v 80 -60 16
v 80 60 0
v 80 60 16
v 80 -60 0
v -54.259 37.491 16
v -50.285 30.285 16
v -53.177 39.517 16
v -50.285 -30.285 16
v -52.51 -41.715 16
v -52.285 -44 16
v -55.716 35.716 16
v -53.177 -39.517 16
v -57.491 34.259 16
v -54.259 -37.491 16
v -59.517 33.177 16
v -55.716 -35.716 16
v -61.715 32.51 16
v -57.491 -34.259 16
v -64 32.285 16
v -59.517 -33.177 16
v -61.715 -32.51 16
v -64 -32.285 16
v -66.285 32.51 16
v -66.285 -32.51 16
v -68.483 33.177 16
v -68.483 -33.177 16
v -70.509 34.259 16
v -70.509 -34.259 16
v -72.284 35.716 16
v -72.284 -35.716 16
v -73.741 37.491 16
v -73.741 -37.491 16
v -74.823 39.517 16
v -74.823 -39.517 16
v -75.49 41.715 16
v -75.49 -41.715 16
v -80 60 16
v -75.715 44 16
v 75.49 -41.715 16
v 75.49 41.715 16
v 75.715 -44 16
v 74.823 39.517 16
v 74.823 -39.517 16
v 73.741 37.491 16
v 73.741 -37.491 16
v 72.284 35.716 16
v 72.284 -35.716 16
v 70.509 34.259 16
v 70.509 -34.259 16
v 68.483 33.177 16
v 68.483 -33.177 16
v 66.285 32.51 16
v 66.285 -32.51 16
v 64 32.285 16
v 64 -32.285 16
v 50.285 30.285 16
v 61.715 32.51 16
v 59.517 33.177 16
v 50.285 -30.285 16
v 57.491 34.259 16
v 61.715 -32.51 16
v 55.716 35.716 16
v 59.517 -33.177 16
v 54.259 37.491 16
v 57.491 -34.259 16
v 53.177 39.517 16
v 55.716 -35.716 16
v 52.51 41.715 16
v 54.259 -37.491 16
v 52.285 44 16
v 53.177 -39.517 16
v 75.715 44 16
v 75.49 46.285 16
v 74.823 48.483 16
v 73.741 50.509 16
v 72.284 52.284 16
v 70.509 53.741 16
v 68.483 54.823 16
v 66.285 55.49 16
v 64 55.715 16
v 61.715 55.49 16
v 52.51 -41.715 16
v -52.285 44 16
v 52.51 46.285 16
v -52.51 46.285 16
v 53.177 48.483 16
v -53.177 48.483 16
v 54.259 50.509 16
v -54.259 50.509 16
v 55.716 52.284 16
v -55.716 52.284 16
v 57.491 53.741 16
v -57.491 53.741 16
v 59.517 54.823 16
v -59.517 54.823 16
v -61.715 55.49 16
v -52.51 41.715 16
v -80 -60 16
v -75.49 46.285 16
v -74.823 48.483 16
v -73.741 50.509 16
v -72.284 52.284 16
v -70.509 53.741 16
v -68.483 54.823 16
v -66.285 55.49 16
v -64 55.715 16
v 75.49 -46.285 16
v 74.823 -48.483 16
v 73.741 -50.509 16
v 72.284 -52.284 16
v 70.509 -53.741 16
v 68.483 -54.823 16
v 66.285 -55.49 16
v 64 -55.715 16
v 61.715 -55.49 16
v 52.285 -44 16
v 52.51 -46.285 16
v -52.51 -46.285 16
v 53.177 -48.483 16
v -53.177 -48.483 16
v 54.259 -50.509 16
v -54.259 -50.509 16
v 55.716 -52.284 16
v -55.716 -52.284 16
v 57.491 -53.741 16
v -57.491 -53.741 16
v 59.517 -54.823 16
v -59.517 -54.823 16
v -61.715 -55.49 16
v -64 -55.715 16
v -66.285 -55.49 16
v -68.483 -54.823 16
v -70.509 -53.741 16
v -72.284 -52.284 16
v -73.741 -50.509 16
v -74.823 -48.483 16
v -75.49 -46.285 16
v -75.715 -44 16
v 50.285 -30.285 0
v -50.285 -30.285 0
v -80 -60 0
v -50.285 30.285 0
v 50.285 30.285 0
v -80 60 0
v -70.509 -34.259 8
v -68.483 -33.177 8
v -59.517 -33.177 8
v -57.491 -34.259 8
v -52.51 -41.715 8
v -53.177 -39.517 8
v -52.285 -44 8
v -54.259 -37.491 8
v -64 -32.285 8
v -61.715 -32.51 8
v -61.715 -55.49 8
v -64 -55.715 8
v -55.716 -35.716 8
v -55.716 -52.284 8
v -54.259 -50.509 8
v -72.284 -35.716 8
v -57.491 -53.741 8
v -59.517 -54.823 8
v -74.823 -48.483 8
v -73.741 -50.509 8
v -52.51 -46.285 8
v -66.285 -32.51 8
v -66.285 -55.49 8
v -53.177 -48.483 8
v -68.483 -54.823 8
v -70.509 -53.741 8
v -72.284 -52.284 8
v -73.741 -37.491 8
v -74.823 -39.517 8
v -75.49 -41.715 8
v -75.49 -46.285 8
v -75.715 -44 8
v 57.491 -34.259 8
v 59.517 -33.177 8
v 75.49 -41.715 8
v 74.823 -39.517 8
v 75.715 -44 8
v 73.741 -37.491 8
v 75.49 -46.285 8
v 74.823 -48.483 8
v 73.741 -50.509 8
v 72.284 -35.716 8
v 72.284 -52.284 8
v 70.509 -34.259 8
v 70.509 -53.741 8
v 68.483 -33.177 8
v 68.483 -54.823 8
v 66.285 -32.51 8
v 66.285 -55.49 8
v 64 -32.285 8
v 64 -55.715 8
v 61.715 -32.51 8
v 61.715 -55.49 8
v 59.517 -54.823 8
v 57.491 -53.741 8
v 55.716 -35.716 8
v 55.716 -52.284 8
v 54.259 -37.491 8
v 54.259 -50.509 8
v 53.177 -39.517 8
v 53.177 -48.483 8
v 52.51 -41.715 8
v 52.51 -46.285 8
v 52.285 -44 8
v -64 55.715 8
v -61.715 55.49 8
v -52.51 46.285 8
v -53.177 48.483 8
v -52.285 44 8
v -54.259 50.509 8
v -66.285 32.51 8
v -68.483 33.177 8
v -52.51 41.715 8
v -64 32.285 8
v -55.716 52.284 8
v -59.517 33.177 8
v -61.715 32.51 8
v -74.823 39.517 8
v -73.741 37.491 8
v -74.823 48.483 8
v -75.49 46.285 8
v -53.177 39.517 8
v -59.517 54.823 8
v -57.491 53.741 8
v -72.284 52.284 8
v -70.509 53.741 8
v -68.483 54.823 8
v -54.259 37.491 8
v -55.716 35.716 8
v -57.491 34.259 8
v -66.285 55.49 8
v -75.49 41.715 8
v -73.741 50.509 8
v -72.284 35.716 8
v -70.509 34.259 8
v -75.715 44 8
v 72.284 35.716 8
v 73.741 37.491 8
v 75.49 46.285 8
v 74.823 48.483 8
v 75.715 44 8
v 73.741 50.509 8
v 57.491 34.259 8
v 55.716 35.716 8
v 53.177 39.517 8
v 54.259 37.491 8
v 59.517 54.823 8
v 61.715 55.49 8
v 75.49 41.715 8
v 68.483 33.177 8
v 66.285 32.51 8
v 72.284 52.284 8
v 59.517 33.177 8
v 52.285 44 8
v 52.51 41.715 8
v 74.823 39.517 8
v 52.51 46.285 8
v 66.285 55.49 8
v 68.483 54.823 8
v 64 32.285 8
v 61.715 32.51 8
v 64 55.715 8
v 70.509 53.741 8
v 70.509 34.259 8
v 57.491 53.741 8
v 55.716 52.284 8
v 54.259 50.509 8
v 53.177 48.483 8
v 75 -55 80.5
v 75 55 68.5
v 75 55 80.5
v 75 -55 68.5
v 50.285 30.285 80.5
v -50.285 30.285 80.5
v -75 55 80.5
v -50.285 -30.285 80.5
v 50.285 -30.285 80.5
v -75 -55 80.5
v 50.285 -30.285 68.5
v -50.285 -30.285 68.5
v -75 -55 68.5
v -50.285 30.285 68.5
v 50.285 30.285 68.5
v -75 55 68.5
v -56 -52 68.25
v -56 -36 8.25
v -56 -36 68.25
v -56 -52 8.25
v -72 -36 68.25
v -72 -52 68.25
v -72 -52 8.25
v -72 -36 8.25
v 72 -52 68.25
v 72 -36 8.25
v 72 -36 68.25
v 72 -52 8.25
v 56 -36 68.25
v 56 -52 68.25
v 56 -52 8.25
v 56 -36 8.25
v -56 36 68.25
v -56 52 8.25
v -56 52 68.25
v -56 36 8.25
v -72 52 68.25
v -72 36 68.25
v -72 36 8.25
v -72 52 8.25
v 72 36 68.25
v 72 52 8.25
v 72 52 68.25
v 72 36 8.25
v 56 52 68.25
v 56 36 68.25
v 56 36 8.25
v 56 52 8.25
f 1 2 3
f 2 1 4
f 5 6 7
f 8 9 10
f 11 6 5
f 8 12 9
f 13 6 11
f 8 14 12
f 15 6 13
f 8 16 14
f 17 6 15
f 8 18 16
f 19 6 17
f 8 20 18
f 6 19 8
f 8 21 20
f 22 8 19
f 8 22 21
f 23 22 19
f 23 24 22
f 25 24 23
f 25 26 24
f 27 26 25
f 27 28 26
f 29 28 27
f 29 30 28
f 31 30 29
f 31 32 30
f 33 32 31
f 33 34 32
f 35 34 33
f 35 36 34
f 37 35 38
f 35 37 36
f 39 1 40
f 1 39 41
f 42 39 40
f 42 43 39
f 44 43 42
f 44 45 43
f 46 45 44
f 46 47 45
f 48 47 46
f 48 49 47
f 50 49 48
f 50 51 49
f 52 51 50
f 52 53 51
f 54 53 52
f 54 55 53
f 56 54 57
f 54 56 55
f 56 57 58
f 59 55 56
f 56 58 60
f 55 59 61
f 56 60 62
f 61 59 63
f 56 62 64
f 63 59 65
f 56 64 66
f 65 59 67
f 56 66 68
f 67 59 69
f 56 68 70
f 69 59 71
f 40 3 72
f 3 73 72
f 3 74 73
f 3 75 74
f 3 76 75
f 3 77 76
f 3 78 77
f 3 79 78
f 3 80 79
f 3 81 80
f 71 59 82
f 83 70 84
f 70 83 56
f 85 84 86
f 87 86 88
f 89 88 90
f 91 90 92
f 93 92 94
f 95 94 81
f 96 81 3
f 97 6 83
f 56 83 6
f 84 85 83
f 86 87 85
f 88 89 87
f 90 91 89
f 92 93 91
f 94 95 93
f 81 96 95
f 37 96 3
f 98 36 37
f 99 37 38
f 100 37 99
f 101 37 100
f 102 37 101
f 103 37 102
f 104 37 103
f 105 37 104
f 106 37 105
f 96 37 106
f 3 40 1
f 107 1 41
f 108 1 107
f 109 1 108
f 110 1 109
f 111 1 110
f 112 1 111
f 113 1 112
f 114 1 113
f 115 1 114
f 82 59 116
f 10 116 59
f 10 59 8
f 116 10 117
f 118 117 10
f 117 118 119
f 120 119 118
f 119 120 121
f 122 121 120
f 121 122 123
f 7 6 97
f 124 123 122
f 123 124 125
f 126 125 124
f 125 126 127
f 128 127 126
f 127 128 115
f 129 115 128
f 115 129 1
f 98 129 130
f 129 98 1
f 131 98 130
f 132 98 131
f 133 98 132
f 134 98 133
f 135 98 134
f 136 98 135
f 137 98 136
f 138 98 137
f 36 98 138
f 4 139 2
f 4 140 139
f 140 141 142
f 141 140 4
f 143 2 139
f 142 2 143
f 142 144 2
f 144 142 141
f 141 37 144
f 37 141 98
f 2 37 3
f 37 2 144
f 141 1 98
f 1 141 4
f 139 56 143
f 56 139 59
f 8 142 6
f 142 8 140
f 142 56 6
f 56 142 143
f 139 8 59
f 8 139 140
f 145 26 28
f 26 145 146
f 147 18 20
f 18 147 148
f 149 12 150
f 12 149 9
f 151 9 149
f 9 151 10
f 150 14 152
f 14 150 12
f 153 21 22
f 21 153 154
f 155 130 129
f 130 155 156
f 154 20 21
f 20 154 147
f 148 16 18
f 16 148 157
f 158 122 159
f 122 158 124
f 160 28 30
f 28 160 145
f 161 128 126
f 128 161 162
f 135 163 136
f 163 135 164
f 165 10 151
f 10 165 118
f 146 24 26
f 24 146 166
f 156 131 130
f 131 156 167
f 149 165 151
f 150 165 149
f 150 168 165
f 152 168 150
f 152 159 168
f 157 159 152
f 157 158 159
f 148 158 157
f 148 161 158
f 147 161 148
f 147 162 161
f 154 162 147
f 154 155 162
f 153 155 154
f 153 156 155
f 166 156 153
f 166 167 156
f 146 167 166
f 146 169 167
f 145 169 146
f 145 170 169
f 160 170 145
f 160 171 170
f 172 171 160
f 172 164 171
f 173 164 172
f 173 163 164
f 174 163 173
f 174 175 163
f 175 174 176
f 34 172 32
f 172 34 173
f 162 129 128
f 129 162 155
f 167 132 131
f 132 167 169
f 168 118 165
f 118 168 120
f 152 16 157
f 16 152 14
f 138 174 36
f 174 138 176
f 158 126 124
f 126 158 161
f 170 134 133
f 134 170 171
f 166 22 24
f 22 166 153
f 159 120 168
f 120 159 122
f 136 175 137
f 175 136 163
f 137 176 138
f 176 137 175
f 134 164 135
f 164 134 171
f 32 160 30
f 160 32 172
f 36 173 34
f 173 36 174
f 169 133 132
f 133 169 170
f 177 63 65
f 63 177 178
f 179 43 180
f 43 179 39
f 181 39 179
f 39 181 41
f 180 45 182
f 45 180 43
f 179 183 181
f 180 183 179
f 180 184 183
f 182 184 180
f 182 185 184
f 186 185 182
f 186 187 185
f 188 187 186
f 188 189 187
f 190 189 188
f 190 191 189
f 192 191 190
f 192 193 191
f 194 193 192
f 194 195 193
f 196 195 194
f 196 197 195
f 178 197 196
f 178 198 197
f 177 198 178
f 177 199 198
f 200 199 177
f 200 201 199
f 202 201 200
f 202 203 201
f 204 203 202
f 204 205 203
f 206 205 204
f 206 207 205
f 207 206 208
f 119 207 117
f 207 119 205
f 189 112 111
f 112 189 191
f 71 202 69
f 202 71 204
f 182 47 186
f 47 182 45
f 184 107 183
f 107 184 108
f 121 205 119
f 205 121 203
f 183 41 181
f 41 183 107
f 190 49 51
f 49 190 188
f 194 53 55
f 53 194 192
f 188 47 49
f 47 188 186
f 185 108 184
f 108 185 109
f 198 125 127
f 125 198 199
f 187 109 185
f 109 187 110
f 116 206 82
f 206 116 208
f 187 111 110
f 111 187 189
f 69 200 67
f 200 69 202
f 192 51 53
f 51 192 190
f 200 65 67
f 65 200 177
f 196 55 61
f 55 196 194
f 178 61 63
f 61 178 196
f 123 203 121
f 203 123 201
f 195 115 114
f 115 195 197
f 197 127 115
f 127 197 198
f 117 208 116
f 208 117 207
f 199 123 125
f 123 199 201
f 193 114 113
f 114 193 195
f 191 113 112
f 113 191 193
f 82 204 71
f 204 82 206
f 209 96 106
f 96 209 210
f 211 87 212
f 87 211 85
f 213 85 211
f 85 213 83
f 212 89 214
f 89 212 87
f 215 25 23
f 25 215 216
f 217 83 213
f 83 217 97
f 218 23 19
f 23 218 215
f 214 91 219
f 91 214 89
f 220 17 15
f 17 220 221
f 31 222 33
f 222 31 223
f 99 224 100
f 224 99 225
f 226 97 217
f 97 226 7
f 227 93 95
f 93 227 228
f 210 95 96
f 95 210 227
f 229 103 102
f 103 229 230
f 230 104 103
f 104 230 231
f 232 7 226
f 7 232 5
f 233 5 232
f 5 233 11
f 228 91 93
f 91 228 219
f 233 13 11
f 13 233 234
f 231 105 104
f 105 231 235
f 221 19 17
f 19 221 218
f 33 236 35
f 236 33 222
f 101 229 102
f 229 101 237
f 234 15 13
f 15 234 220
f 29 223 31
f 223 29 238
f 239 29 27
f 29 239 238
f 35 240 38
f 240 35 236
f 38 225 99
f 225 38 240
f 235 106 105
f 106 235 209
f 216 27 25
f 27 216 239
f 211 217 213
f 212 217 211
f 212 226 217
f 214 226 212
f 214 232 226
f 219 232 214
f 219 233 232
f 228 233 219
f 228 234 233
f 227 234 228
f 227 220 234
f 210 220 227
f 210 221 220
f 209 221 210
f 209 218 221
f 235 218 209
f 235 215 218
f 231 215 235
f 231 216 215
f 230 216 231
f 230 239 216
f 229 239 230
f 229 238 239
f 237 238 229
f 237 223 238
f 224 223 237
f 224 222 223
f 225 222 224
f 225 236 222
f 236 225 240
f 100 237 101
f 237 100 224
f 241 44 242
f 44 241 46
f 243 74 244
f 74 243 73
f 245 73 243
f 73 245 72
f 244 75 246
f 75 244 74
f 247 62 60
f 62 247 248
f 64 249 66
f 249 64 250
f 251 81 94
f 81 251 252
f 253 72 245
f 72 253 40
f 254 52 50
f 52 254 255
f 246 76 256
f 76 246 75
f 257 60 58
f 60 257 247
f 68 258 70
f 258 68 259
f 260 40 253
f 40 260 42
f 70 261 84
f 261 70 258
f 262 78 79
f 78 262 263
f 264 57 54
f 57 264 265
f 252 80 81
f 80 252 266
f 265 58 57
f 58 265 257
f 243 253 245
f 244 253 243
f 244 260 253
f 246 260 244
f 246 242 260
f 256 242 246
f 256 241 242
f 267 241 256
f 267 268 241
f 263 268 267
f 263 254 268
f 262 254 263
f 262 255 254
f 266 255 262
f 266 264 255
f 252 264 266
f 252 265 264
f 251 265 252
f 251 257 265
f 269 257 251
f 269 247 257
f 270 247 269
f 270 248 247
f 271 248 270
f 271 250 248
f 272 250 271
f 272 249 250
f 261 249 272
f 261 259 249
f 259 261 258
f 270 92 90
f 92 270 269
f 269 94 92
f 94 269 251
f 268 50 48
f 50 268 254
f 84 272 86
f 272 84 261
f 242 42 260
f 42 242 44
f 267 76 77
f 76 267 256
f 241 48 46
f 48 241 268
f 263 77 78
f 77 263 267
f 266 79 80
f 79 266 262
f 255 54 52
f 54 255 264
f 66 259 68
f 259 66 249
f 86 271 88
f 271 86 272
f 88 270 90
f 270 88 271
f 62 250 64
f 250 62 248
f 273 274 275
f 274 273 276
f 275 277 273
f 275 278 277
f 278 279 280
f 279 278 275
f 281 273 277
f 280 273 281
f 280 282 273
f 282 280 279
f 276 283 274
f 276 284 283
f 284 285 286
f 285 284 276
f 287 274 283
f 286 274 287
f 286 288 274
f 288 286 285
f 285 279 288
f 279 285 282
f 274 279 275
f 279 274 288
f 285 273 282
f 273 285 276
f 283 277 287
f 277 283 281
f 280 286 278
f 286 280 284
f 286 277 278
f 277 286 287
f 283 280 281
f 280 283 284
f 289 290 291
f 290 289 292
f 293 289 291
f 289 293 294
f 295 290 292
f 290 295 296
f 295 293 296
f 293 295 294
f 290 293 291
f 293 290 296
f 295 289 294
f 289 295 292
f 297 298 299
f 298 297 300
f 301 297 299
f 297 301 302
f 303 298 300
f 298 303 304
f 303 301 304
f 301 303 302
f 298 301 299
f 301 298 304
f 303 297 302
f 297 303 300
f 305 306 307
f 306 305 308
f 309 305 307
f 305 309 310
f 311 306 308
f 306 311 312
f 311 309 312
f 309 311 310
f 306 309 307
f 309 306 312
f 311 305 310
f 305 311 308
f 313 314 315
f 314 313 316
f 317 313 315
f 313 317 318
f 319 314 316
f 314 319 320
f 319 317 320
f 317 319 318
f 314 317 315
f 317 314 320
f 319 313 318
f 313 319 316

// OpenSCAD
$fn = 32;

// ------------------------------------------------------------------------
// Frame cube: base 160 x 120 mm, posts 60 mm tall
// Every part is its own module, assembly() places every instance.
// ------------------------------------------------------------------------

// --- part 1 ---
module base_frame() {
  difference() {
    translate([-80, -60, 0]) cube([160, 120, 16]);
    translate([-50.285, -30.285, -1]) cube([100.57, 60.57, 18]);
    translate([-64, -44, 8]) cylinder(h = 9, d = 23.43);
    translate([64, -44, 8]) cylinder(h = 9, d = 23.43);
    translate([-64, 44, 8]) cylinder(h = 9, d = 23.43);
    translate([64, 44, 8]) cylinder(h = 9, d = 23.43);
  }
}

// --- part 2 ---
module corner_post() {
  translate([-8, -8, 0]) cube([16, 16, 60]);
}

// --- part 3 ---
module top_frame() {
  difference() {
    translate([-75, -55, 0]) cube([150, 110, 12]);
    translate([-50.285, -30.285, -1]) cube([100.57, 60.57, 14]);
  }
}

// --- assembly ---
module assembly() {
  color([0.80, 0.24, 0.20]) translate([0, 0, 0]) rotate([0, 0, 0]) base_frame();
  color([0.20, 0.45, 0.75]) translate([-64, -44, 8.25]) rotate([0, 0, 0]) corner_post();
  color([0.25, 0.62, 0.32]) translate([64, -44, 8.25]) rotate([0, 0, 0]) corner_post();
  color([0.92, 0.70, 0.18]) translate([-64, 44, 8.25]) rotate([0, 0, 0]) corner_post();
  color([0.58, 0.35, 0.70]) translate([64, 44, 8.25]) rotate([0, 0, 0]) corner_post();
  color([0.16, 0.66, 0.66]) translate([0, 0, 68.5]) rotate([0, 0, 0]) top_frame();
}

assembly();
